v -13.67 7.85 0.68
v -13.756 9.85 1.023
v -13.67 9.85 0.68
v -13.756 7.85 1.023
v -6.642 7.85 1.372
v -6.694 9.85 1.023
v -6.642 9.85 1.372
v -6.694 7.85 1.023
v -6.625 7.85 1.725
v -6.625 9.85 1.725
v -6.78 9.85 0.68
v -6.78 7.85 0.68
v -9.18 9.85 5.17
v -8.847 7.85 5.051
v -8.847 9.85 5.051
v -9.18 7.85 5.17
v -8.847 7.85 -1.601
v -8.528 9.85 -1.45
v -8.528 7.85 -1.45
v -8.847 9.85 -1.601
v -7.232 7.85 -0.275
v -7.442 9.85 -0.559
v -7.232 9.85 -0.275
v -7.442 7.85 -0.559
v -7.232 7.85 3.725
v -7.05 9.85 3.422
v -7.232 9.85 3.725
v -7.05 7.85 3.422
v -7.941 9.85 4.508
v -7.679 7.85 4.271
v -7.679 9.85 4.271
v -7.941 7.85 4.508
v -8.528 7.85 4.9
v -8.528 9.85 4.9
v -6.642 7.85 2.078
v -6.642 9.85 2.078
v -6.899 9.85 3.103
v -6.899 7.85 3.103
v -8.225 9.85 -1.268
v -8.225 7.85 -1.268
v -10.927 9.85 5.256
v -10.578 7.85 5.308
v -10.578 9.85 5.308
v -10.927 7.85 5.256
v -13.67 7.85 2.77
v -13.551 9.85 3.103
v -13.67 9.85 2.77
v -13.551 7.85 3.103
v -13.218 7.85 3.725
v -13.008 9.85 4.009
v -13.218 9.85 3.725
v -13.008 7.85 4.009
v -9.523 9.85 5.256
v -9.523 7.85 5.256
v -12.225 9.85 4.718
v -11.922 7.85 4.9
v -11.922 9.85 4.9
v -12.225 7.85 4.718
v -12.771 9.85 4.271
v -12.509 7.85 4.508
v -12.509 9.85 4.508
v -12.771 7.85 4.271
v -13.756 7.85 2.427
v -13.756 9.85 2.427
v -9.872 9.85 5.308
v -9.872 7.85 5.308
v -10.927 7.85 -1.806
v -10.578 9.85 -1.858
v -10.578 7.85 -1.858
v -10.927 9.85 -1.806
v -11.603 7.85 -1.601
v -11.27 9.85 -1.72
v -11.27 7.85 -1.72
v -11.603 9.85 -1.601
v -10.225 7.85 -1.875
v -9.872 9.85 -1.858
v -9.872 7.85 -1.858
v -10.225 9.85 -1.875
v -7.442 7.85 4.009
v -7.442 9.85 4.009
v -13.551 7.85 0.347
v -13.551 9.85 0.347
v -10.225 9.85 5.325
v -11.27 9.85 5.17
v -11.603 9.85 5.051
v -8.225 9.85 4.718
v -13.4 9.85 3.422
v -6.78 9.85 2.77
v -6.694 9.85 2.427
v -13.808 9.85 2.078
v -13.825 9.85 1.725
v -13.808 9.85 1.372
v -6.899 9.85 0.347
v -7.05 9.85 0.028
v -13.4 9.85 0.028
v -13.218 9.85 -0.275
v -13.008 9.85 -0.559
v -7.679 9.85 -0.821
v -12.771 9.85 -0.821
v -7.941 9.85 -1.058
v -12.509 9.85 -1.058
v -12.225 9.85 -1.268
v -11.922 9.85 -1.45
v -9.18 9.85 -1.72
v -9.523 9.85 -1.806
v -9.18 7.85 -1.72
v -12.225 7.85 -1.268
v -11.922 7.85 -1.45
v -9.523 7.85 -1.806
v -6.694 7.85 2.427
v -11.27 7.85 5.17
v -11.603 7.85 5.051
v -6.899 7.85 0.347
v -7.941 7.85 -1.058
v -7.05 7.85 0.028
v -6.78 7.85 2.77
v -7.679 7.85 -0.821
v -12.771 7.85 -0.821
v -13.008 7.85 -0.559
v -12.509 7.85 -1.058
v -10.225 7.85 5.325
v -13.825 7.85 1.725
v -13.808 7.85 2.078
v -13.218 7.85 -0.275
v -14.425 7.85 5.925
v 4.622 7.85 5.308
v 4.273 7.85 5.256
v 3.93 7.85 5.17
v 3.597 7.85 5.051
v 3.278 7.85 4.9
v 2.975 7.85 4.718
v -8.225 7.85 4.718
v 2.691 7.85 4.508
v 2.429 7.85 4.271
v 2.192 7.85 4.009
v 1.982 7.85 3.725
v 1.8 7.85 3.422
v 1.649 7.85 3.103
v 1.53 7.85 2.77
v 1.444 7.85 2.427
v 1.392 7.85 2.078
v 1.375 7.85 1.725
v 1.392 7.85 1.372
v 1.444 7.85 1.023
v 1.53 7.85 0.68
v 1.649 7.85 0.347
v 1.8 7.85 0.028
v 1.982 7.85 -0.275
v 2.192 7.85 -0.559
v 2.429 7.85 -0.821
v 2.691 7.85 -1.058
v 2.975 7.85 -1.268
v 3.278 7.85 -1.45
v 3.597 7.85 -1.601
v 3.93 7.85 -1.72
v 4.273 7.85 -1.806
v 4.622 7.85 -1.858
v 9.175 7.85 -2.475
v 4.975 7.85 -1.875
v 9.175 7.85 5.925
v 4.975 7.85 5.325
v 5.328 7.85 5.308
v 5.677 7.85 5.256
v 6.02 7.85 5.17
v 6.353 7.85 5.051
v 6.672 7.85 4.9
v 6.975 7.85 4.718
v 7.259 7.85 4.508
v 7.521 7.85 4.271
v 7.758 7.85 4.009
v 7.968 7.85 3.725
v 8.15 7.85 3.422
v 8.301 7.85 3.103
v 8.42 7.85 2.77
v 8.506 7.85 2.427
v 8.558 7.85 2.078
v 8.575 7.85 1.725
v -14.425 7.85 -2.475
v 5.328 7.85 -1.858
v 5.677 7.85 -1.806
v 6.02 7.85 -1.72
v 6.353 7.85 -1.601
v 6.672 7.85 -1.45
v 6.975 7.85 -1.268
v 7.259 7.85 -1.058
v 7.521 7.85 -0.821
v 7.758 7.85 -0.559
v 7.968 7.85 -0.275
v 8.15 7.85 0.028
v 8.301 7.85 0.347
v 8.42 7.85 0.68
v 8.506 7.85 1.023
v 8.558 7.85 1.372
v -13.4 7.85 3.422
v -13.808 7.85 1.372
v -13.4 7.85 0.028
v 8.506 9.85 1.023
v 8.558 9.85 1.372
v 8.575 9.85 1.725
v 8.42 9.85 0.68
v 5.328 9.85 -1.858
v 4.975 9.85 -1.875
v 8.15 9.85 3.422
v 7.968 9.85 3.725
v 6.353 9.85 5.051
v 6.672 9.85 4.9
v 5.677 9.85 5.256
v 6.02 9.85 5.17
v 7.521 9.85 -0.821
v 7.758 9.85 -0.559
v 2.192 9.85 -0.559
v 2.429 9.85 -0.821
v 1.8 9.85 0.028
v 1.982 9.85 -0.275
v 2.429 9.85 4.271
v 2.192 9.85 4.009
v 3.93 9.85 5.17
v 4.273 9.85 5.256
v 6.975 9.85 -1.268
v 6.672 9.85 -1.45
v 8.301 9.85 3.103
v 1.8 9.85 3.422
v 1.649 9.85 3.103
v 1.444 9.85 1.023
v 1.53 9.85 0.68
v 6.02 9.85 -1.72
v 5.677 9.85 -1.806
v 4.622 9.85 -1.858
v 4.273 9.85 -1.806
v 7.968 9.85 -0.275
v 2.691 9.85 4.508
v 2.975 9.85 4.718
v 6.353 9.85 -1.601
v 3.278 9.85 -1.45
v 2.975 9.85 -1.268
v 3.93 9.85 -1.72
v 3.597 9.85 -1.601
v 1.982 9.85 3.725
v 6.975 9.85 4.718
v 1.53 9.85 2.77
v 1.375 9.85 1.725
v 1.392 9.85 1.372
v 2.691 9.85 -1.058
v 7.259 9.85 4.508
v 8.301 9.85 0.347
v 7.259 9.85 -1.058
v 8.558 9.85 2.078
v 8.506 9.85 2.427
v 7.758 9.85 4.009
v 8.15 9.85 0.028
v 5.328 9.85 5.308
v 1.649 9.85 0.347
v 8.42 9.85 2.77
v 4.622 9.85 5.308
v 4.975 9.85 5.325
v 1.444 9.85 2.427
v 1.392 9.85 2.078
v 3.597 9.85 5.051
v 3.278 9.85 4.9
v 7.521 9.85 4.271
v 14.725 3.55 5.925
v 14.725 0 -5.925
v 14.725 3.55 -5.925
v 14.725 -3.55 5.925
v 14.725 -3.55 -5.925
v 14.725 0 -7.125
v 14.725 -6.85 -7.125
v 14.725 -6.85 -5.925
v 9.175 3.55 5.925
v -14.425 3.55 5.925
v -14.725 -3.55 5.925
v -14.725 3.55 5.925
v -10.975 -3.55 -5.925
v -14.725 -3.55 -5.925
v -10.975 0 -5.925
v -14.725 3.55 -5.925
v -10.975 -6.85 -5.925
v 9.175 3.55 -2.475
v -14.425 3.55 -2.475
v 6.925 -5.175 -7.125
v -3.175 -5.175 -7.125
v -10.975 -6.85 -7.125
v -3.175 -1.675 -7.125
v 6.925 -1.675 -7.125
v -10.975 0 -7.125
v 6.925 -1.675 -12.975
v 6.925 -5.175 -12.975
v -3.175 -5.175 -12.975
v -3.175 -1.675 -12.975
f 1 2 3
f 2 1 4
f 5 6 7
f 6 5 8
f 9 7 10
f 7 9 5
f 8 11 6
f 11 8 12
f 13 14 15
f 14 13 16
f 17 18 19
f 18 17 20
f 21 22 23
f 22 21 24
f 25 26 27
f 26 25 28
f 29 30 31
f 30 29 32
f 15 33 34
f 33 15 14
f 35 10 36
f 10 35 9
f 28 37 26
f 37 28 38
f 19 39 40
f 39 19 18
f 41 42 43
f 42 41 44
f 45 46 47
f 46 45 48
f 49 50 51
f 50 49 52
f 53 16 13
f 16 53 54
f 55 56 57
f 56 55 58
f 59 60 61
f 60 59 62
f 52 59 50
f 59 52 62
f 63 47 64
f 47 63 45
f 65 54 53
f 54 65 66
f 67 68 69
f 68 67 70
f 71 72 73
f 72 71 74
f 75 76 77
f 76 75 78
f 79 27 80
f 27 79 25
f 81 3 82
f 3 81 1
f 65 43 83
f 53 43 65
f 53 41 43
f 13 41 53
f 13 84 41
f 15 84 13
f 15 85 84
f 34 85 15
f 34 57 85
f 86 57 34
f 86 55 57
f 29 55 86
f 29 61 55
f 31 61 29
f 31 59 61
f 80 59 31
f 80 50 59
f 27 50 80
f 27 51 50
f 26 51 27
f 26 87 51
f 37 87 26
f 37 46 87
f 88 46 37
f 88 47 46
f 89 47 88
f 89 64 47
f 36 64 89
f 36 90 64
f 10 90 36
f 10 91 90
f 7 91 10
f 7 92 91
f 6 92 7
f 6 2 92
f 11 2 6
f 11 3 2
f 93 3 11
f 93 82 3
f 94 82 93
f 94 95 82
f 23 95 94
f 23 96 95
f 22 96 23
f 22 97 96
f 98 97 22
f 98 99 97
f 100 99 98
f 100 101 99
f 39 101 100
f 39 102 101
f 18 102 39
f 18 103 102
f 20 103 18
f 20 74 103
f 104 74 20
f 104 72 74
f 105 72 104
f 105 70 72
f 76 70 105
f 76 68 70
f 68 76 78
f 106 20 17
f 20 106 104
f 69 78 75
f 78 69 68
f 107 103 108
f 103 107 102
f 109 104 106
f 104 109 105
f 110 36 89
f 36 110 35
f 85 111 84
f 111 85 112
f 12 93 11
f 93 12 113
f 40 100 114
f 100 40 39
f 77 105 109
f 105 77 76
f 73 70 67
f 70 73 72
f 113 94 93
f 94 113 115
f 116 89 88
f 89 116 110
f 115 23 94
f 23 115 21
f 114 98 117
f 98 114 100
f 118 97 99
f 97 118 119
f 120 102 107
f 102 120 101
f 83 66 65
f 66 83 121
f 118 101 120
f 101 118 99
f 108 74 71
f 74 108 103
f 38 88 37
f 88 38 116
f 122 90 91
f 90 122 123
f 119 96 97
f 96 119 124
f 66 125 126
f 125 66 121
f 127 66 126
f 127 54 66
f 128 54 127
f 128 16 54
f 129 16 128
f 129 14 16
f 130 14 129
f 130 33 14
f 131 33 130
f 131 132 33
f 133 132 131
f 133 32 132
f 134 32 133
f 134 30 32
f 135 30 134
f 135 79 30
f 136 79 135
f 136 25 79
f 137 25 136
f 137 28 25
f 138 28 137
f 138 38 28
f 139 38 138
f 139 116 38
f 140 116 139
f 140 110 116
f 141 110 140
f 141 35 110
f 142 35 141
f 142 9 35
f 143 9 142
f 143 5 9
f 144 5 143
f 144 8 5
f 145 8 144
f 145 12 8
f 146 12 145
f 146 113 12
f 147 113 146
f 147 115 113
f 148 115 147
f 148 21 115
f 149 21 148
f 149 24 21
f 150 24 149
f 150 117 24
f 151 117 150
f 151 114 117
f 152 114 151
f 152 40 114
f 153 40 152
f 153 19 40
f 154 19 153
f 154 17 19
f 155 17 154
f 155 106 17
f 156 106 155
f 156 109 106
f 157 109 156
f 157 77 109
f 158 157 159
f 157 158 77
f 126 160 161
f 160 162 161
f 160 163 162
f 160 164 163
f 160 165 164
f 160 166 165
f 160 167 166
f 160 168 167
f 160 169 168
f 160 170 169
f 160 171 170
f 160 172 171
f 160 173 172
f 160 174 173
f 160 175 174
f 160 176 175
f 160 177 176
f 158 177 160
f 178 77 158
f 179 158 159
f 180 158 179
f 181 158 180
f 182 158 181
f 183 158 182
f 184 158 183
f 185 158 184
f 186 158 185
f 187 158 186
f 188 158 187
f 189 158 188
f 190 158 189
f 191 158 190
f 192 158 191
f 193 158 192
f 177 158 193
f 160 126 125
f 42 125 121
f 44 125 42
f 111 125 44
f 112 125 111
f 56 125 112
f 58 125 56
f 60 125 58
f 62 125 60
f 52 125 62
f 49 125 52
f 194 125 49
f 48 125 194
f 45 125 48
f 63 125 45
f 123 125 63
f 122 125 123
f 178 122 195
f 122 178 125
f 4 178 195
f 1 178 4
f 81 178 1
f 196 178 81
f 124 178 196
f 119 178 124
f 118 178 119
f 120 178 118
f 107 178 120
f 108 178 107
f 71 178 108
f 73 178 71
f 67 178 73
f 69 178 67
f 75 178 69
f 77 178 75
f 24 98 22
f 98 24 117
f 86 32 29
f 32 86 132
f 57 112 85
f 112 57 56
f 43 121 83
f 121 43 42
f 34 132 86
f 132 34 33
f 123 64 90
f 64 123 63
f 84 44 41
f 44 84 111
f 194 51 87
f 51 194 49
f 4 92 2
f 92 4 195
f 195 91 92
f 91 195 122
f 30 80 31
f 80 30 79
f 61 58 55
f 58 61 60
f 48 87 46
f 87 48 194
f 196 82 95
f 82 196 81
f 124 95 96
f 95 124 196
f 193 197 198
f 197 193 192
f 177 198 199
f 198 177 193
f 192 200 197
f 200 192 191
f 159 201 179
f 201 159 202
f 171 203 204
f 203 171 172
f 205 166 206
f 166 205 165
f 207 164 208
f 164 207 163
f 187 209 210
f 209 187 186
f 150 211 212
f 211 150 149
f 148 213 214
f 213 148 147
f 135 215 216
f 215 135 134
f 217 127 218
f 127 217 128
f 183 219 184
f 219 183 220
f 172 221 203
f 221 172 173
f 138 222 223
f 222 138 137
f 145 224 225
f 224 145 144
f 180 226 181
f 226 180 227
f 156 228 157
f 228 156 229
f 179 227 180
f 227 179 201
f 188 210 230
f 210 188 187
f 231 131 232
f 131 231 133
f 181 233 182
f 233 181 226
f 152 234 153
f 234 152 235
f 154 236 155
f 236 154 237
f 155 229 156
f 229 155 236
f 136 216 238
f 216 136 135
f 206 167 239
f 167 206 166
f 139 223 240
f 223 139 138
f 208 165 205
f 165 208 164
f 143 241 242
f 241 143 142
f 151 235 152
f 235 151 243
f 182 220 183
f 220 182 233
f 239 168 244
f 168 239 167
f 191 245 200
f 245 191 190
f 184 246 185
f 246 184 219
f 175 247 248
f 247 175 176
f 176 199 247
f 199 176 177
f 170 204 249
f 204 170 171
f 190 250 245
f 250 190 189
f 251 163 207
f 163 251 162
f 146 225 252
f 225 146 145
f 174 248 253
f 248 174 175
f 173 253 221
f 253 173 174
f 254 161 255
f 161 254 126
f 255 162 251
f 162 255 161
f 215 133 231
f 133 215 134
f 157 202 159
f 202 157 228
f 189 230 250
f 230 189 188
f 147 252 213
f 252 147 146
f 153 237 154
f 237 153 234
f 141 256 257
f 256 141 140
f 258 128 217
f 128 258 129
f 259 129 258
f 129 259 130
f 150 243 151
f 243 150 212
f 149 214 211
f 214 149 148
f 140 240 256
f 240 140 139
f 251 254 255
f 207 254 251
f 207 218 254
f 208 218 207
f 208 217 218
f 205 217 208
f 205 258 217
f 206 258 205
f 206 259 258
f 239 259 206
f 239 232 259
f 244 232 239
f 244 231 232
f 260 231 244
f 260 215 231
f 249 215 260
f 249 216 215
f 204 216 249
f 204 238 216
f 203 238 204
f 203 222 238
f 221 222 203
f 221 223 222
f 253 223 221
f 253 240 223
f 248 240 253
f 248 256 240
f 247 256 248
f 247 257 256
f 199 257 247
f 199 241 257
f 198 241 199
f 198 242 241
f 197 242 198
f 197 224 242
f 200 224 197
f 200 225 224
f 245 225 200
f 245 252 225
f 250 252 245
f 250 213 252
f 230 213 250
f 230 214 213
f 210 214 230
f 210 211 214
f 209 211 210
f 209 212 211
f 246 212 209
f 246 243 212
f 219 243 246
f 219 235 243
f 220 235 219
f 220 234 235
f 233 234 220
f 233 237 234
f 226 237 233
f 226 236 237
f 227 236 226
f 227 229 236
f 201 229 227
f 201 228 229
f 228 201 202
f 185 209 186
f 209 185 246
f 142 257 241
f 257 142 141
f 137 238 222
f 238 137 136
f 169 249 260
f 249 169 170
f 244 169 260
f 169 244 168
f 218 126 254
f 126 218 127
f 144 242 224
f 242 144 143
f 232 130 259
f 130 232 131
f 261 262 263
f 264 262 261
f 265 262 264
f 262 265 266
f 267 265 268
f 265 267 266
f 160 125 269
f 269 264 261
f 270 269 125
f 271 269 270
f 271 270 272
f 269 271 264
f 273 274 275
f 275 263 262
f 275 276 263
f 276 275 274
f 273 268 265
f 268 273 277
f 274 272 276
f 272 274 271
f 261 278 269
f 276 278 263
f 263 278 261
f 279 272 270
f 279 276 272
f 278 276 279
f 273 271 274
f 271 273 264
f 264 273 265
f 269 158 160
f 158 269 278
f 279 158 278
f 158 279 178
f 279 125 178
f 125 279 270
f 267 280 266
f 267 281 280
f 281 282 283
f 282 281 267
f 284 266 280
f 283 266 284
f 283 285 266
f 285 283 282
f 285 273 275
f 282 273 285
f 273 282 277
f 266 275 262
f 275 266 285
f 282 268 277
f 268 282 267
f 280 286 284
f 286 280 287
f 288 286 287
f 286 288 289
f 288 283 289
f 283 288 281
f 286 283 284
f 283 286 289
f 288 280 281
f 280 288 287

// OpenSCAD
// Sharp GP2Y0D413K0F Distance Sensor
// Unit: mm
// Coordinate System: 
// - Origin: Center of main body
// - Z-axis: Mounting surface (PWB / Connector side) faces -Z
// - Y-axis: Lenses face +Y (Front)
// - X-axis: Width direction

$fn = 64;

module gp2y0d413k0f() {
    // --- Dimensions ---
    
    // 1. Main Body
    mb_w = 29.45; // Width
    mb_d = 7.1;   // Depth
    mb_h = 13.05 - 1.2; // Height to PWB top surface (11.85)
    
    // 3. Lenses
    lens_dia = 7.2;
    lens_d = 2.0;
    // X positions relative to the left edge of the main body
    lens_left_x = -mb_w/2 + 4.5;
    lens_right_x = -mb_w/2 + 19.7;
    
    // 2. Lens Case
    lc_w = 23.6; // Width to enclose both lenses
    lc_d = 6.3 - lens_d; // Front extension (4.3)
    lc_h = 8.4;
    lc_x_offset = (lens_left_x + lens_right_x) / 2;
    
    // 4. PWB (Printed Wiring Board)
    pwb_th = 1.2;
    pwb_indent_left = 3.75; // Indent from left edge
    pwb_w = mb_w - pwb_indent_left;
    pwb_x_offset = -mb_w/2 + pwb_indent_left + pwb_w/2;
    pwb_back_extension = 3.3; // Extension beyond main body back
    pwb_d = (mb_d/2) + pwb_back_extension; // Depth (6.85)
    pwb_y_offset = -pwb_d/2; // Front edge aligns with main body center (Y=0)
    
    // 5. Connector
    conn_w = 10.1;
    conn_h = 18.9 - 13.05; // Extension below PWB (5.85)
    conn_d = 3.5; // Assumed depth
    conn_x_offset = pwb_x_offset; // Centered on PWB
    conn_y_offset = pwb_y_offset; // Centered on PWB depth
    
    
    // --- Assembly ---
    
    // Main Body
    color("#333333")
    cube([mb_w, mb_d, mb_h], center=true);
    
    // Lens Case
    color("#222222")
    translate([lc_x_offset, mb_d/2 + lc_d/2, mb_h/2 - lc_h/2])
    cube([lc_w, lc_d, lc_h], center=true);
    
    // Lenses
    color("#0a0a0a") {
        // Emitter (Left)
        translate([lens_left_x, mb_d/2 + lc_d, mb_h/2 - lc_h/2])
        rotate([-90, 0, 0])
        cylinder(h=lens_d, d=lens_dia);
        
        // Detector (Right)
        translate([lens_right_x, mb_d/2 + lc_d, mb_h/2 - lc_h/2])
        rotate([-90, 0, 0])
        cylinder(h=lens_d, d=lens_dia);
    }
    
    // PWB
    color("#2E8B57") // SeaGreen
    translate([pwb_x_offset, pwb_y_offset, -mb_h/2 - pwb_th/2])
    cube([pwb_w, pwb_d, pwb_th], center=true);
    
    // Connector
    color("#F5F5F5") // WhiteSmoke
    translate([conn_x_offset, conn_y_offset, -mb_h/2 - pwb_th - conn_h/2])
    cube([conn_w, conn_d, conn_h], center=true);
}

// Render the sensor
gp2y0d413k0f();
